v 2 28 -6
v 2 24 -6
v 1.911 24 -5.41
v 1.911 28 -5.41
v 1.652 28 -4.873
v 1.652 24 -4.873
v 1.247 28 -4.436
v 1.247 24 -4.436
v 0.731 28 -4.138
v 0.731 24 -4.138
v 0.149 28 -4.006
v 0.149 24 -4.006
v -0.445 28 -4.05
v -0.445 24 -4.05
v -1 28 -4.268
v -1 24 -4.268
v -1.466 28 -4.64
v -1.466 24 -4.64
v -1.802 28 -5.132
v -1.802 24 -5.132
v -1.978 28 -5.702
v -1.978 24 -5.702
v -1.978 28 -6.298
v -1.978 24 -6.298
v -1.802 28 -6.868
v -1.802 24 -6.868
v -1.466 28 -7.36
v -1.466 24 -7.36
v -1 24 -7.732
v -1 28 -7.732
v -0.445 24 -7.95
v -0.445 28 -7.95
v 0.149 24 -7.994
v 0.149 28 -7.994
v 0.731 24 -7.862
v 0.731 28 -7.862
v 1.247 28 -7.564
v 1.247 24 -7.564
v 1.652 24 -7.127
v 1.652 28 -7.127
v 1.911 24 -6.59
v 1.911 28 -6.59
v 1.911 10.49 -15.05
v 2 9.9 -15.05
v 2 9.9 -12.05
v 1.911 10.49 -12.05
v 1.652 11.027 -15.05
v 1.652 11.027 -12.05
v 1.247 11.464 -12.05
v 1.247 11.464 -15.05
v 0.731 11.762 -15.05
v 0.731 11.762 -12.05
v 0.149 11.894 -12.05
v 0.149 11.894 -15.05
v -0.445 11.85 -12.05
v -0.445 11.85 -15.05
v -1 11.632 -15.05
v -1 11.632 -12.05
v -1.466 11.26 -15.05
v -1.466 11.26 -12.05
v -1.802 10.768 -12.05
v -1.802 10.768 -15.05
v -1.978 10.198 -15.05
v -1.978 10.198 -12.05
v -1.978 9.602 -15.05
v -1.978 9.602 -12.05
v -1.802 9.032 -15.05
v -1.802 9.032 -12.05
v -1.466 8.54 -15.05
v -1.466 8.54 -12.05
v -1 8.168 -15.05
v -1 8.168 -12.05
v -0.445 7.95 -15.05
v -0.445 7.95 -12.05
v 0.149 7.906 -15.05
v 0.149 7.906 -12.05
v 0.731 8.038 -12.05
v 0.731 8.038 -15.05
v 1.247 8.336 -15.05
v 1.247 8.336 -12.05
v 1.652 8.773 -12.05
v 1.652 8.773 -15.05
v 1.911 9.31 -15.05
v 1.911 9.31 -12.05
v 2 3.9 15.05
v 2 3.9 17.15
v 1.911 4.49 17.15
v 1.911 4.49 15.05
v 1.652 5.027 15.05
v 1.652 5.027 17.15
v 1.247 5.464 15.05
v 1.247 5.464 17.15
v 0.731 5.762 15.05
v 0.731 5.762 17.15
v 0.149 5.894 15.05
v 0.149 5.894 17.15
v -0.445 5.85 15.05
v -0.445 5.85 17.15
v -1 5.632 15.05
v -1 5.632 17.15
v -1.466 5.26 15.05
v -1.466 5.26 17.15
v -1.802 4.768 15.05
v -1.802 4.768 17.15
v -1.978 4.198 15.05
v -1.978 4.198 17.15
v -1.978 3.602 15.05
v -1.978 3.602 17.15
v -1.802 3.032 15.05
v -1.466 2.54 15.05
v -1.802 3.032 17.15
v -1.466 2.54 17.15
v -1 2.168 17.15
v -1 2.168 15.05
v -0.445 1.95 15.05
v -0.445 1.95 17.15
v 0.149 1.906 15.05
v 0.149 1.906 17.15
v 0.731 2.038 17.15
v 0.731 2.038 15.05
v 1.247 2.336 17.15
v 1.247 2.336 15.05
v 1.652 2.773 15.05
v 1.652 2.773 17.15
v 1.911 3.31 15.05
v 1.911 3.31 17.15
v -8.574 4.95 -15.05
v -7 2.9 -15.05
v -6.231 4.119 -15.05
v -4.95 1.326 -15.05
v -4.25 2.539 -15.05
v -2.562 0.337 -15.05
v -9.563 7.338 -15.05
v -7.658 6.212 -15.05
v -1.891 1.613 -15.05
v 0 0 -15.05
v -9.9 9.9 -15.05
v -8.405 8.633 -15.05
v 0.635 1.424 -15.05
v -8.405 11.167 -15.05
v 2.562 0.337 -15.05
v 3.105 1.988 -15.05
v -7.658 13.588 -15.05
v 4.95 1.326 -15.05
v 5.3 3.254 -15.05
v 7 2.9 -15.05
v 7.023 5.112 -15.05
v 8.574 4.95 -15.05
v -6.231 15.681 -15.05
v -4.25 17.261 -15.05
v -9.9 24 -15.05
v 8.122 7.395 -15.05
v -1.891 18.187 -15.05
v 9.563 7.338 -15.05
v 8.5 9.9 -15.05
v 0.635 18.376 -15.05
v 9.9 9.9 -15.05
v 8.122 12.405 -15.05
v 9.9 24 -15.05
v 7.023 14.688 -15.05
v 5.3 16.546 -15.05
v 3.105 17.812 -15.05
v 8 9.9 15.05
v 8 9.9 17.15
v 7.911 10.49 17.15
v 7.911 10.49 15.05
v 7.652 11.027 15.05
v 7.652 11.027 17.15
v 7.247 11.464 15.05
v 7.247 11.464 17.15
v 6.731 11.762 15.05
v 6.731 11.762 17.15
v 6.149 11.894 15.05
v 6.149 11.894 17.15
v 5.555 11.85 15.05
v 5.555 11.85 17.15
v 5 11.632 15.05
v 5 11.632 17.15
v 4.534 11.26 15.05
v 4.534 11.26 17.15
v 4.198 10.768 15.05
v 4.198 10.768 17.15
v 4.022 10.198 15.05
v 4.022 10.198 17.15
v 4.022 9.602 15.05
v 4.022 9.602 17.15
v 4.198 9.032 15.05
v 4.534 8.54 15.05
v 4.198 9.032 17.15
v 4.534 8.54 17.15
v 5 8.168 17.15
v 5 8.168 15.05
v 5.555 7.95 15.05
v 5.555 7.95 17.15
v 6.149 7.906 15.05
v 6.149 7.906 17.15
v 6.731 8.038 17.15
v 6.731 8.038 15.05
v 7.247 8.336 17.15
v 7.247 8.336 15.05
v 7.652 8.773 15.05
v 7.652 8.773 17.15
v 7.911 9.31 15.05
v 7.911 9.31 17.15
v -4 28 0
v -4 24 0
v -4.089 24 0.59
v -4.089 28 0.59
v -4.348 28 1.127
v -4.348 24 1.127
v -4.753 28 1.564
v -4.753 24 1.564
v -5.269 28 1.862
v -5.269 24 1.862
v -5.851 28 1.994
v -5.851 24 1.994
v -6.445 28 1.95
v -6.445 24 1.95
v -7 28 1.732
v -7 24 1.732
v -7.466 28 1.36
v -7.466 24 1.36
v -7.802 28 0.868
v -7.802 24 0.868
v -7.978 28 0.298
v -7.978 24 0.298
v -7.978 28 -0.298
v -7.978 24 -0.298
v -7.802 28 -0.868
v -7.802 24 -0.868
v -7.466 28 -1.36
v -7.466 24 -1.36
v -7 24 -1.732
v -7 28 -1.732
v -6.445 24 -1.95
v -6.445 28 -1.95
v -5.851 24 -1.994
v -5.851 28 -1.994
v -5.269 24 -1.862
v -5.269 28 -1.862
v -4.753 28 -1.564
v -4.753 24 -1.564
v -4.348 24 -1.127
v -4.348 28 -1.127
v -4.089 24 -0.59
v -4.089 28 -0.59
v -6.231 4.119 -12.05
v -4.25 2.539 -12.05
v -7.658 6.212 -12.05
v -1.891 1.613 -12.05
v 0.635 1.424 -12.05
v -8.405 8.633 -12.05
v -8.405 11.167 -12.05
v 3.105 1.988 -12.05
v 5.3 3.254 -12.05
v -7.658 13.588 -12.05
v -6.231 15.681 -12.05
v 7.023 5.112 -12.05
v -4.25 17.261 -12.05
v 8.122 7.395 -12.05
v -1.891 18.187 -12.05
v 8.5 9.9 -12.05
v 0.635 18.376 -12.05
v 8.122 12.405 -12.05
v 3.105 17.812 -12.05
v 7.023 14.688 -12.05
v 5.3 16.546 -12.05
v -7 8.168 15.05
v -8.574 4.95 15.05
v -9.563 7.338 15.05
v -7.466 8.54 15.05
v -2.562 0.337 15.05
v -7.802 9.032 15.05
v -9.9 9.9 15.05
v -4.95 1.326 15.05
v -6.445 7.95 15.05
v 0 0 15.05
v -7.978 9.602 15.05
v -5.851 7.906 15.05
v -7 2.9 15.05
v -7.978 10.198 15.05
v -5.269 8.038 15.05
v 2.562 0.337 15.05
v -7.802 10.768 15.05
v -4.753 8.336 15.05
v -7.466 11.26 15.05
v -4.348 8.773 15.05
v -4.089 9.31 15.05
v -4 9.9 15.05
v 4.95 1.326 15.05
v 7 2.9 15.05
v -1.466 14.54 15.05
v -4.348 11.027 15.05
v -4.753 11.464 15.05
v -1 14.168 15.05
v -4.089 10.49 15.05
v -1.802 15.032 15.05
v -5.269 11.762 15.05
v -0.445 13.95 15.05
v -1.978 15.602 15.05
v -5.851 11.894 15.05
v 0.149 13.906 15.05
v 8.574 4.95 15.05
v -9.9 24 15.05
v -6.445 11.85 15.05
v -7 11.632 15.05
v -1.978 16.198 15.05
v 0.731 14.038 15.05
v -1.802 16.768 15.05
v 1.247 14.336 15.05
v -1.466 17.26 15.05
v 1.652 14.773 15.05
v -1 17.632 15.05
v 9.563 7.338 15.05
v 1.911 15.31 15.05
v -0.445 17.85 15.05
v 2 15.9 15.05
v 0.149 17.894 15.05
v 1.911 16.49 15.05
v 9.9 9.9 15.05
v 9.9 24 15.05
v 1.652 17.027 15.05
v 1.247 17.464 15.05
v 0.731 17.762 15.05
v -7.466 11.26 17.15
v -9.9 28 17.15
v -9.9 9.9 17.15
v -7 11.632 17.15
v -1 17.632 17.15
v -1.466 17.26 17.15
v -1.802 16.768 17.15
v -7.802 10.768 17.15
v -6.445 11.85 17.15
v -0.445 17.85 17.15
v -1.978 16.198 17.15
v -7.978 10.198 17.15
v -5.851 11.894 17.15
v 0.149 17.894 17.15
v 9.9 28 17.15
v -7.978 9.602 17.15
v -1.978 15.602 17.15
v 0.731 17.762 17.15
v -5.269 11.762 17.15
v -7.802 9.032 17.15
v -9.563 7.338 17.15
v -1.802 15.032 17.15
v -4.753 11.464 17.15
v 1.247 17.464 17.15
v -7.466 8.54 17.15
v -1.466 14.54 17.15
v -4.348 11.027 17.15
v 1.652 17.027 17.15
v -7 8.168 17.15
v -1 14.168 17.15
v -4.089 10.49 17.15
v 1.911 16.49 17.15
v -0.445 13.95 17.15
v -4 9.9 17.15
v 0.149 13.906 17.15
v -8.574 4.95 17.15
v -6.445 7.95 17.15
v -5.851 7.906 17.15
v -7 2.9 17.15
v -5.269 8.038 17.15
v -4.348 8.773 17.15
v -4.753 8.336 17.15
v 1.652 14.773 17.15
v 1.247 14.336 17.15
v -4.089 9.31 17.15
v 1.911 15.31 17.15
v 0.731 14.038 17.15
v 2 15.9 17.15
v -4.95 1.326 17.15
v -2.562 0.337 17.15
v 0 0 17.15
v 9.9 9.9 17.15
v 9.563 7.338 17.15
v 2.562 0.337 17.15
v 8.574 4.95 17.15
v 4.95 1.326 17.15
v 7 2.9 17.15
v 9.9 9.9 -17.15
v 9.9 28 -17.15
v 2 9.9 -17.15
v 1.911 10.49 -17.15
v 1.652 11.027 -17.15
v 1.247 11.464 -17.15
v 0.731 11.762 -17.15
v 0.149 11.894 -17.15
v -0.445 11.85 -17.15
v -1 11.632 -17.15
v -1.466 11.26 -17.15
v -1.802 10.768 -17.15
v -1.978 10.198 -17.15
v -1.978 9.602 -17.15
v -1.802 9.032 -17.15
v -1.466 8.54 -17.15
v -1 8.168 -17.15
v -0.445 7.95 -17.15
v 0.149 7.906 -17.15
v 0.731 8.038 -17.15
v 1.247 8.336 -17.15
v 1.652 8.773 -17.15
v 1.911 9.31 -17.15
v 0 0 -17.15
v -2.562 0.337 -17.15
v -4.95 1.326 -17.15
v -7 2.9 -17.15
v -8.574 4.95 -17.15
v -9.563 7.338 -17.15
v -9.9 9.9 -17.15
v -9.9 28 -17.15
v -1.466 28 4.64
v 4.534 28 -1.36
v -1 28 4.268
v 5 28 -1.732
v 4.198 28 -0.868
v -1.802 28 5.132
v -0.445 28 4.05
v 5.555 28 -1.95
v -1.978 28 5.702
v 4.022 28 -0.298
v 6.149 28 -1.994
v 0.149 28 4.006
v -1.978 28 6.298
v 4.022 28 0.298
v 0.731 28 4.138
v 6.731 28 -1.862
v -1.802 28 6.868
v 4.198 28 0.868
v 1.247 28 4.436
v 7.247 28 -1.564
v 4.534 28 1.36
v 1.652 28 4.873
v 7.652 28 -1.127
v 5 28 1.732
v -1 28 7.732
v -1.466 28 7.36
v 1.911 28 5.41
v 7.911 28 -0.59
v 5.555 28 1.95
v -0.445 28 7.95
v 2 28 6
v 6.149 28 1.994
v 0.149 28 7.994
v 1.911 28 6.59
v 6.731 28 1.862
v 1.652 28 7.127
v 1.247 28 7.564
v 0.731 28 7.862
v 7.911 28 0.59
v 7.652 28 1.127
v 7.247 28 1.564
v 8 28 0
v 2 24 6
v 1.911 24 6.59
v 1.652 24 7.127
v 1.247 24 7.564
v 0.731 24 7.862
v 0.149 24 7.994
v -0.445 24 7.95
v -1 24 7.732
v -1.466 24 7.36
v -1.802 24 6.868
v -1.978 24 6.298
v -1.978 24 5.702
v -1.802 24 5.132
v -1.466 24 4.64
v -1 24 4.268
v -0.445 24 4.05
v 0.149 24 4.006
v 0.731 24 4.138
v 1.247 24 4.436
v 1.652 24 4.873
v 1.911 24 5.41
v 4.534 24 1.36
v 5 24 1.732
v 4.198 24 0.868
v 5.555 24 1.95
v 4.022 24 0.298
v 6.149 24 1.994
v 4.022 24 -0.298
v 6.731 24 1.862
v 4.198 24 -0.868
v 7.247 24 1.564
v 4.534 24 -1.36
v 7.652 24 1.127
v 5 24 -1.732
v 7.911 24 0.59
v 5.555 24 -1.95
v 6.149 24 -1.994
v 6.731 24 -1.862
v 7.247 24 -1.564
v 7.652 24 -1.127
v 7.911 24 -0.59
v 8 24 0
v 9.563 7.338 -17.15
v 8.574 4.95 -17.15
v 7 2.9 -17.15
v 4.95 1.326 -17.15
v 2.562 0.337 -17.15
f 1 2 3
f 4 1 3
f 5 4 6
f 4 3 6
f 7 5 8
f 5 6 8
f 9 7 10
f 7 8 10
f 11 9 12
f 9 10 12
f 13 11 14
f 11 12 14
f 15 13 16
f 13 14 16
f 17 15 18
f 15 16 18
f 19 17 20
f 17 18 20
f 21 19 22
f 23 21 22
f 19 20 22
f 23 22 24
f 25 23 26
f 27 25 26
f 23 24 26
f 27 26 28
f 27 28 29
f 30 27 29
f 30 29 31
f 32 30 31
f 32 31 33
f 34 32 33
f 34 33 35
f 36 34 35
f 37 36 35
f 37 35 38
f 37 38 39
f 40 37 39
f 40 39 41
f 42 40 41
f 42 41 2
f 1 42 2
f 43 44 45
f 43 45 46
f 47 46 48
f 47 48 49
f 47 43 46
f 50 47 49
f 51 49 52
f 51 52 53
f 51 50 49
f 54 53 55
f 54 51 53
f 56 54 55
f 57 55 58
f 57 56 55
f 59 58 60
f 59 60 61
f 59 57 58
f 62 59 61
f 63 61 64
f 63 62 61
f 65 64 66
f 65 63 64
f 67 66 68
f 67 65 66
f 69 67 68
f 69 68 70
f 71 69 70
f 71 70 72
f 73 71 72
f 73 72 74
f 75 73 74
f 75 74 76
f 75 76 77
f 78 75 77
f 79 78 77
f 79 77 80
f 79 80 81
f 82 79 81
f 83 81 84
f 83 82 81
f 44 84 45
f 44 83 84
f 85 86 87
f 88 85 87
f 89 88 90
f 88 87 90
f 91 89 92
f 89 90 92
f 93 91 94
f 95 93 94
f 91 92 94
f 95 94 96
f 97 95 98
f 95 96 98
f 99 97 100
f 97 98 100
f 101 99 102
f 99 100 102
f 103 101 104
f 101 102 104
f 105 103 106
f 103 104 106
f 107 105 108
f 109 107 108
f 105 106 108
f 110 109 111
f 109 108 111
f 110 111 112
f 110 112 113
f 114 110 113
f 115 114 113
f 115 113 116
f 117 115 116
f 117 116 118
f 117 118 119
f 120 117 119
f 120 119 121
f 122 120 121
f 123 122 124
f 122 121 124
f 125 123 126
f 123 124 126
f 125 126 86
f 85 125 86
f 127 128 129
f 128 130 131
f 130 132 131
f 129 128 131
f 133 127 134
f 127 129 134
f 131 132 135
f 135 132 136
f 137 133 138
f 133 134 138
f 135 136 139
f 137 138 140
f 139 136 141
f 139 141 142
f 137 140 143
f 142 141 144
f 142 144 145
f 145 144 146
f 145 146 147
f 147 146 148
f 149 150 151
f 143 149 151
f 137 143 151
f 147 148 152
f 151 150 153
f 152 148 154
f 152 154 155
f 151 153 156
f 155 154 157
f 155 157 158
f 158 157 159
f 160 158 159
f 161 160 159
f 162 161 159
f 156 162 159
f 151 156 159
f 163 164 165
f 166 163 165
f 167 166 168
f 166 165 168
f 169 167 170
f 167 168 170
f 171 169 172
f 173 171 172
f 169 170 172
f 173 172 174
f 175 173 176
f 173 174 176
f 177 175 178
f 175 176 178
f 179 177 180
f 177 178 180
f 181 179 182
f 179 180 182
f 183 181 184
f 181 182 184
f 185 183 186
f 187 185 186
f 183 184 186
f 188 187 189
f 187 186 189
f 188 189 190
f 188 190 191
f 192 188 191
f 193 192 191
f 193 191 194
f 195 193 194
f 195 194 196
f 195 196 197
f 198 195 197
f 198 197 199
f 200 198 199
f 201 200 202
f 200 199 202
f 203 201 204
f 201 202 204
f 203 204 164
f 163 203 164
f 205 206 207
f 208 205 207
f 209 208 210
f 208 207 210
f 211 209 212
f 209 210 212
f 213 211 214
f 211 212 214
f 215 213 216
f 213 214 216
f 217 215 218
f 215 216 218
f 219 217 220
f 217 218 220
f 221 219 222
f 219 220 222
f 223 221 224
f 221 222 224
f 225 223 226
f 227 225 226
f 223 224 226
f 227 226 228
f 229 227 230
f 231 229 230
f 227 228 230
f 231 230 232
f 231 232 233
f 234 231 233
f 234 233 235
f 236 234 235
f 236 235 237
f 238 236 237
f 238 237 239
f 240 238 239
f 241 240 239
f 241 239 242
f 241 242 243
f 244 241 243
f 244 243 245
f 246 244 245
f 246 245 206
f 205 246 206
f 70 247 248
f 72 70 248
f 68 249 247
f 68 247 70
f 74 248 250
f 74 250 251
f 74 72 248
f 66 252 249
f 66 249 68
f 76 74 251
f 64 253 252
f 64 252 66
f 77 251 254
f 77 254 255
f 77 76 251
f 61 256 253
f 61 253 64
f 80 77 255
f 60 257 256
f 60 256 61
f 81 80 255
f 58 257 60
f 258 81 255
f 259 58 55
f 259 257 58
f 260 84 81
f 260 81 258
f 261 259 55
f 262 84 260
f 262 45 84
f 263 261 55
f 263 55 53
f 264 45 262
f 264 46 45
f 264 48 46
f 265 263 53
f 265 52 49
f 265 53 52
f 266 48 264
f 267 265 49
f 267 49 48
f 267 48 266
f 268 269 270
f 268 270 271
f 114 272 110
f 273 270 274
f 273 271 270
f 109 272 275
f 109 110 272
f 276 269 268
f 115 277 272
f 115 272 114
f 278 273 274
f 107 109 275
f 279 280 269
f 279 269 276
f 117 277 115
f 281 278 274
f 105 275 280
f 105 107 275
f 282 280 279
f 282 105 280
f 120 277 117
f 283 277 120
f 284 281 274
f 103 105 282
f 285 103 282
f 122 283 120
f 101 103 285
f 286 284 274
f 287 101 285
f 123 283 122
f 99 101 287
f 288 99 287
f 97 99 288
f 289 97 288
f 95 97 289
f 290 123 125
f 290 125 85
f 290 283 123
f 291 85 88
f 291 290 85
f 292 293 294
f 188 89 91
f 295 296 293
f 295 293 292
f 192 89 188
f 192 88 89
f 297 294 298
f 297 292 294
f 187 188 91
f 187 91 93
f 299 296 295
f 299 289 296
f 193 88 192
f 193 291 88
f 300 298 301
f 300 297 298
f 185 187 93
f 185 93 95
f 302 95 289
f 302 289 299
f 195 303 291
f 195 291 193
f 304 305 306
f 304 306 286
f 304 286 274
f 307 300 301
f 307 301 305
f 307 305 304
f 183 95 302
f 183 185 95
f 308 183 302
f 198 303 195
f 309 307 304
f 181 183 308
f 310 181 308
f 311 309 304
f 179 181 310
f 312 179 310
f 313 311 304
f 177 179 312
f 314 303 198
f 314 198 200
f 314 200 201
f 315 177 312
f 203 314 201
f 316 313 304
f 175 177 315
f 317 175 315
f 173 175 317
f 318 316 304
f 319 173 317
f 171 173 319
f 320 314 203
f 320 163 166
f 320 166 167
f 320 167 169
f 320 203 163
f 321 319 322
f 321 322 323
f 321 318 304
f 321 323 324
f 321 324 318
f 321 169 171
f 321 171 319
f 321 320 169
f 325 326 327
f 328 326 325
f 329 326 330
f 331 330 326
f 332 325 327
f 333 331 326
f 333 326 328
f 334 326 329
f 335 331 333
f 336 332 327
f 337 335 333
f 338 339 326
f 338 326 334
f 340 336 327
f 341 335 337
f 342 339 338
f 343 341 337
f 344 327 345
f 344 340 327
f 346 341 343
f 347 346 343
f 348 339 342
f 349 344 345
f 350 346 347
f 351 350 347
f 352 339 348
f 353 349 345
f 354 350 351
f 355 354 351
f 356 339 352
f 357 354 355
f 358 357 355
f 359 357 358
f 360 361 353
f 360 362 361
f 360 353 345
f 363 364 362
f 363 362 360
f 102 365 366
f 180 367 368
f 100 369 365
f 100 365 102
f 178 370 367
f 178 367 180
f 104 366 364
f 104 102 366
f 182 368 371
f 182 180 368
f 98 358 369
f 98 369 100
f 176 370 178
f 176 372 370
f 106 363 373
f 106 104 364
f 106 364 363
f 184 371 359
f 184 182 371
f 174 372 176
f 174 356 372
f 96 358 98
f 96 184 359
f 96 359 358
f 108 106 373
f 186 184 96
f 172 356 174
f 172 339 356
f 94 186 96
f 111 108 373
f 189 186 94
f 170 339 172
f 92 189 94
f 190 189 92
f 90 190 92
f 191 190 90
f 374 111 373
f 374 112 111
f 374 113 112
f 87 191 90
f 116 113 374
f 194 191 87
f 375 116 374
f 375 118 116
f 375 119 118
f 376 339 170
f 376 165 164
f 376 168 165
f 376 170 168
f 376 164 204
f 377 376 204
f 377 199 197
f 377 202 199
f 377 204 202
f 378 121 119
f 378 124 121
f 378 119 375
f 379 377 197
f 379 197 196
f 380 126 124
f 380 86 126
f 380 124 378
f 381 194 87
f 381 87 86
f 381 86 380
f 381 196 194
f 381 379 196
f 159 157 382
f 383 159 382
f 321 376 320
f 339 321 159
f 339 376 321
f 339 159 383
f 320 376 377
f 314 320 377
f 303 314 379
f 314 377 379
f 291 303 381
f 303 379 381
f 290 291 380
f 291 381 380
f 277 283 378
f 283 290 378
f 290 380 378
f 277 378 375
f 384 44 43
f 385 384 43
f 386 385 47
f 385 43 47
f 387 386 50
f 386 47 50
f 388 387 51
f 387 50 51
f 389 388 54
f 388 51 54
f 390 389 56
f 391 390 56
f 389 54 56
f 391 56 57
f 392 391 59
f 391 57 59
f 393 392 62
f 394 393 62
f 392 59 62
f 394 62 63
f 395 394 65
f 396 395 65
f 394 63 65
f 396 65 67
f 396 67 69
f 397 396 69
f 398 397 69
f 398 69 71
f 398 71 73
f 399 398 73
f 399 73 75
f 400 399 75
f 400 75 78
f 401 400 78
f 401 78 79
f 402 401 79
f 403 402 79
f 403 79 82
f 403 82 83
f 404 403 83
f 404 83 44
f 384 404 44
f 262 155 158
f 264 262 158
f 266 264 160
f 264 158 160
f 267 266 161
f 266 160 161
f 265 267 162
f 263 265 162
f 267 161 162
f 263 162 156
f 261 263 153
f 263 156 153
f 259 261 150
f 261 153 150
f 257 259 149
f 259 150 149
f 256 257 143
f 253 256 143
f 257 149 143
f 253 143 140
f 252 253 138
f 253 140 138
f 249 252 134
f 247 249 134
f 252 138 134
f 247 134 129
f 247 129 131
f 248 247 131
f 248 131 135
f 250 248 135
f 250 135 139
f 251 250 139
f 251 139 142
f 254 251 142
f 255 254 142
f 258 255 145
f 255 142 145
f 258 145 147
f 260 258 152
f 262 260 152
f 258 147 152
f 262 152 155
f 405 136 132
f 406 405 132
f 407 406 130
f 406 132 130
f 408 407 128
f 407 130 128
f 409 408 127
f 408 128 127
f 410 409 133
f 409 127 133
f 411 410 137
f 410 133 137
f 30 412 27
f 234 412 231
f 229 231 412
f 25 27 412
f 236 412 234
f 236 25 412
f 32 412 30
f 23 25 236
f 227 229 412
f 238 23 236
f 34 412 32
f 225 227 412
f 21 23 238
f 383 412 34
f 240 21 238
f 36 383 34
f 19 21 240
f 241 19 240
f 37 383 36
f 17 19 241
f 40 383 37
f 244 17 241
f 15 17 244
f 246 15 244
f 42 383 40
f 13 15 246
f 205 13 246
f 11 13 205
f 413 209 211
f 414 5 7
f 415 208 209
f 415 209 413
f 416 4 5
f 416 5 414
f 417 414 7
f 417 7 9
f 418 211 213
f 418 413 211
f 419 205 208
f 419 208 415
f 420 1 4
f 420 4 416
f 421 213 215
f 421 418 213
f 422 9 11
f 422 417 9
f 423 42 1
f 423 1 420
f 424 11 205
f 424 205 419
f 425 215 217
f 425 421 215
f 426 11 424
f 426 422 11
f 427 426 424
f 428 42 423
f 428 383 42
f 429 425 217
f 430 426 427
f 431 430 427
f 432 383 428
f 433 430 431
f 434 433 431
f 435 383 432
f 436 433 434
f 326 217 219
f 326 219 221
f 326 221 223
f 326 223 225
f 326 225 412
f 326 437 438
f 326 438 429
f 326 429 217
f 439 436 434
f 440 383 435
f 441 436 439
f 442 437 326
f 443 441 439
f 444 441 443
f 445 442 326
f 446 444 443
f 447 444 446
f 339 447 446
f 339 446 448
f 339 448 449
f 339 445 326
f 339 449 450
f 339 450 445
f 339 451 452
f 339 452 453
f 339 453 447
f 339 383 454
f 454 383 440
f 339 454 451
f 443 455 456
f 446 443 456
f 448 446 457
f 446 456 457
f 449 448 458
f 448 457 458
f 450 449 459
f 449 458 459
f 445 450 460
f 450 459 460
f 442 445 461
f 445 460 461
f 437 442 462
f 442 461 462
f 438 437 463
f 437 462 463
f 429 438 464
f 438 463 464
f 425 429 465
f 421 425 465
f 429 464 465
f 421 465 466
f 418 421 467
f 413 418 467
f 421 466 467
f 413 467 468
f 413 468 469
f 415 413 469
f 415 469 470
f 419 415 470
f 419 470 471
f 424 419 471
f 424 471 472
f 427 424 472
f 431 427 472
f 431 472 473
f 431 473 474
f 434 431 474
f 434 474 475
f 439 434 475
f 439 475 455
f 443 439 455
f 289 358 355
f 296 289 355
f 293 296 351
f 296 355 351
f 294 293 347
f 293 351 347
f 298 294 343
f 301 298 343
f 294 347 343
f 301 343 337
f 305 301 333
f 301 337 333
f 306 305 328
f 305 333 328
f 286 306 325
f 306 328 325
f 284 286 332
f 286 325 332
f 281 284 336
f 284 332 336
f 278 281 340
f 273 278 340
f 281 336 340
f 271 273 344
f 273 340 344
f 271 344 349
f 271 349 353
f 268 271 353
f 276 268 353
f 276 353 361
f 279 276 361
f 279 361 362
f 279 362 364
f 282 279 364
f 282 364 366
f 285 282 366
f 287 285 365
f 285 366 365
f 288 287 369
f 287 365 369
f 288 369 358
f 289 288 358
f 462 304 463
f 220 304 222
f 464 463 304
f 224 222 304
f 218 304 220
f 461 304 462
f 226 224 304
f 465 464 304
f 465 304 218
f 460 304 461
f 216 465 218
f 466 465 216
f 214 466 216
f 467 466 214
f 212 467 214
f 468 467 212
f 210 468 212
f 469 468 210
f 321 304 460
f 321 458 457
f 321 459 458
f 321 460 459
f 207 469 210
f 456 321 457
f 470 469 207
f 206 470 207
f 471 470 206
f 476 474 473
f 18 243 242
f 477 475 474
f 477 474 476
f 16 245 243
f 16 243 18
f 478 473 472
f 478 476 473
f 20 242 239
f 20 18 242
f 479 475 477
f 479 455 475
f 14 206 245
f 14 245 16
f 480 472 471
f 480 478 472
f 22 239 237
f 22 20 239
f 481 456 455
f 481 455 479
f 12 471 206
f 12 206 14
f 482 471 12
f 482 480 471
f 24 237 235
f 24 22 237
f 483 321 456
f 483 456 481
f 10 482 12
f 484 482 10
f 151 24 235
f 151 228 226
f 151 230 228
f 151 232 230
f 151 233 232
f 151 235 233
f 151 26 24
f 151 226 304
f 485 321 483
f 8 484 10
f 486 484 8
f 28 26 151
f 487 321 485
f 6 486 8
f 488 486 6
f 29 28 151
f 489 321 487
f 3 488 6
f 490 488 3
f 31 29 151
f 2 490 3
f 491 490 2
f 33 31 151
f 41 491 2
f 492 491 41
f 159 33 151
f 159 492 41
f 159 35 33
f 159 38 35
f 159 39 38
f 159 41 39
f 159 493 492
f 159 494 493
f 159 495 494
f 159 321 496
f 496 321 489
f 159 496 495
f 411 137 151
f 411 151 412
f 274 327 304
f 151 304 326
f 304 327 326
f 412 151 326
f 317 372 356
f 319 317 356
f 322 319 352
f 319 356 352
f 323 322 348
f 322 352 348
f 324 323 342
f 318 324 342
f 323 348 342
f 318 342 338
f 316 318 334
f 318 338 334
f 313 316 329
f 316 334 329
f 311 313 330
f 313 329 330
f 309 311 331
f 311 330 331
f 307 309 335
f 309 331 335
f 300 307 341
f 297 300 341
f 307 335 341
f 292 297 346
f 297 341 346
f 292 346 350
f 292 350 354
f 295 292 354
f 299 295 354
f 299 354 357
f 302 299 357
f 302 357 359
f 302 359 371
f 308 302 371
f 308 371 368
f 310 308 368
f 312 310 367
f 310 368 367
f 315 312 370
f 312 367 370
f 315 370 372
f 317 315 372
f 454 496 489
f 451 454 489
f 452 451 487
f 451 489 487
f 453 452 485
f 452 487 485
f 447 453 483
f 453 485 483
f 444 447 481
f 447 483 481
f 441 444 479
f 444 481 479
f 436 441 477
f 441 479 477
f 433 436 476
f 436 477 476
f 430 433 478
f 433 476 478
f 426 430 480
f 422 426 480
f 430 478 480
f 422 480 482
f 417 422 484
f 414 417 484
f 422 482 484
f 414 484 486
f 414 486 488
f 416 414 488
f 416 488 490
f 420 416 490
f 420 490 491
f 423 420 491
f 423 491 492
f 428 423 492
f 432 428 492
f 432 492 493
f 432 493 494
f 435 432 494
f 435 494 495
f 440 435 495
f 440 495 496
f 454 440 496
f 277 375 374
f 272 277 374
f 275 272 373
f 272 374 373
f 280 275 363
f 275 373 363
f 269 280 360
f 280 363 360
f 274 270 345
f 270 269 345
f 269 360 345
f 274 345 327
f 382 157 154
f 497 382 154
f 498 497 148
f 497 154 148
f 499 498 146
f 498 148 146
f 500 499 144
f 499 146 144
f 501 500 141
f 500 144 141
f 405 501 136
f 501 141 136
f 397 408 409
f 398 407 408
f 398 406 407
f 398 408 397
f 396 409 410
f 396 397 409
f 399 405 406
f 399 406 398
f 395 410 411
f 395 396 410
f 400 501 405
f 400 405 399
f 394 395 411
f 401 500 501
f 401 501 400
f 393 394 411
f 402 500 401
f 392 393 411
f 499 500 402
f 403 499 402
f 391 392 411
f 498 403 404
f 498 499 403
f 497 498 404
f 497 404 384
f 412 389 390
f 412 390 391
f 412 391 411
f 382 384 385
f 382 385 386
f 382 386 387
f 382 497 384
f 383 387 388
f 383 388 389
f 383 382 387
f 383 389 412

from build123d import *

# Parameters (mm, degrees)
F0_W     = 4
F0_H     = 30.1
F0_H_2   = 2.1
F0_W_2   = 24
F1_DEPTH = 9.9
F3_DEPTH = 34.301
F2_R     = 2
F4_DEPTH = 2.1
F5_R     = 8.5
F5_R_2   = 2
F6_DEPTH = 3
F7_DEPTH = 2.101
F8_R     = 2
F9_DEPTH = 4.001


with BuildPart() as f1:
    # F0 (on Right) → F1 (new body, symmetric)
    with BuildSketch(Plane.YZ):
        Polygon((28, 17.15), (0, 17.15), (0, 15.05), (24, 15.05), (28, 15.05), align=None)
        with Locations((26, 0)):
            Rectangle(F0_W, F0_H)
        with Locations((26, -16.1)):
            Rectangle(F0_W, F0_H_2)
        with Locations((12, -16.1)):
            Rectangle(F0_W_2, F0_H_2)
    extrude(amount=F1_DEPTH, both=True)

    # F2 (on face) → F3 (cut, through all)
    with BuildSketch(Plane.XY.offset(17.15)):
        Polygon((-9.9, 0), (-9.9, 9.9), (-14.9, 9.9), (-14.9, -5), (14.9, -5), (14.9, 9.9), (9.9, 9.9), (9.9, 0), (0, 0), align=None)
        with BuildLine():
            ThreePointArc((0, 0), (-7.000357, 2.899643), (-9.9, 9.9))
            Line((-9.9, 9.9), (-9.9, 0))
            Line((-9.9, 0), (0, 0))
        make_face()
        with BuildLine():
            ThreePointArc((9.9, 9.9), (7.000357, 2.899643), (0, 0))
            Line((0, 0), (9.9, 0))
            Line((9.9, 0), (9.9, 9.9))
        make_face()
    extrude(amount=-F3_DEPTH, mode=Mode.SUBTRACT)

    # F2 (on face) → F4 (cut, through all)
    with BuildSketch(Plane.XY.offset(17.15)):
        with Locations((-6, 9.9)):
            Circle(F2_R)
        with Locations((0, 15.9)):
            Circle(F2_R)
        with Locations((6, 9.9)):
            Circle(F2_R)
        with Locations((0, 3.9)):
            Circle(F2_R)
    extrude(amount=-F4_DEPTH, mode=Mode.SUBTRACT)

    # F5 (on face) → F6 (join)
    with BuildSketch(Plane.XY.offset(-15.05)):
        with Locations((0, 9.9)):
            Circle(F5_R)
        with Locations((0, 9.9)):
            Circle(F5_R_2, mode=Mode.SUBTRACT)
    extrude(amount=F6_DEPTH)

    # F5 (on face) → F7 (cut, through all)
    with BuildSketch(Plane.XY.offset(-15.05)):
        with Locations((0, 9.9)):
            Circle(F5_R_2)
    extrude(amount=-F7_DEPTH, mode=Mode.SUBTRACT)

    # F8 (on face) → F9 (cut, through all)
    with BuildSketch(Plane.XZ.offset(-24)):
        with Locations((0, 6)):
            Circle(F8_R)
        with Locations((6, 0)):
            Circle(F8_R)
        with Locations((0, -6)):
            Circle(F8_R)
        with Locations((-6, 0)):
            Circle(F8_R)
    extrude(amount=-F9_DEPTH, mode=Mode.SUBTRACT)


solid = f1.part
